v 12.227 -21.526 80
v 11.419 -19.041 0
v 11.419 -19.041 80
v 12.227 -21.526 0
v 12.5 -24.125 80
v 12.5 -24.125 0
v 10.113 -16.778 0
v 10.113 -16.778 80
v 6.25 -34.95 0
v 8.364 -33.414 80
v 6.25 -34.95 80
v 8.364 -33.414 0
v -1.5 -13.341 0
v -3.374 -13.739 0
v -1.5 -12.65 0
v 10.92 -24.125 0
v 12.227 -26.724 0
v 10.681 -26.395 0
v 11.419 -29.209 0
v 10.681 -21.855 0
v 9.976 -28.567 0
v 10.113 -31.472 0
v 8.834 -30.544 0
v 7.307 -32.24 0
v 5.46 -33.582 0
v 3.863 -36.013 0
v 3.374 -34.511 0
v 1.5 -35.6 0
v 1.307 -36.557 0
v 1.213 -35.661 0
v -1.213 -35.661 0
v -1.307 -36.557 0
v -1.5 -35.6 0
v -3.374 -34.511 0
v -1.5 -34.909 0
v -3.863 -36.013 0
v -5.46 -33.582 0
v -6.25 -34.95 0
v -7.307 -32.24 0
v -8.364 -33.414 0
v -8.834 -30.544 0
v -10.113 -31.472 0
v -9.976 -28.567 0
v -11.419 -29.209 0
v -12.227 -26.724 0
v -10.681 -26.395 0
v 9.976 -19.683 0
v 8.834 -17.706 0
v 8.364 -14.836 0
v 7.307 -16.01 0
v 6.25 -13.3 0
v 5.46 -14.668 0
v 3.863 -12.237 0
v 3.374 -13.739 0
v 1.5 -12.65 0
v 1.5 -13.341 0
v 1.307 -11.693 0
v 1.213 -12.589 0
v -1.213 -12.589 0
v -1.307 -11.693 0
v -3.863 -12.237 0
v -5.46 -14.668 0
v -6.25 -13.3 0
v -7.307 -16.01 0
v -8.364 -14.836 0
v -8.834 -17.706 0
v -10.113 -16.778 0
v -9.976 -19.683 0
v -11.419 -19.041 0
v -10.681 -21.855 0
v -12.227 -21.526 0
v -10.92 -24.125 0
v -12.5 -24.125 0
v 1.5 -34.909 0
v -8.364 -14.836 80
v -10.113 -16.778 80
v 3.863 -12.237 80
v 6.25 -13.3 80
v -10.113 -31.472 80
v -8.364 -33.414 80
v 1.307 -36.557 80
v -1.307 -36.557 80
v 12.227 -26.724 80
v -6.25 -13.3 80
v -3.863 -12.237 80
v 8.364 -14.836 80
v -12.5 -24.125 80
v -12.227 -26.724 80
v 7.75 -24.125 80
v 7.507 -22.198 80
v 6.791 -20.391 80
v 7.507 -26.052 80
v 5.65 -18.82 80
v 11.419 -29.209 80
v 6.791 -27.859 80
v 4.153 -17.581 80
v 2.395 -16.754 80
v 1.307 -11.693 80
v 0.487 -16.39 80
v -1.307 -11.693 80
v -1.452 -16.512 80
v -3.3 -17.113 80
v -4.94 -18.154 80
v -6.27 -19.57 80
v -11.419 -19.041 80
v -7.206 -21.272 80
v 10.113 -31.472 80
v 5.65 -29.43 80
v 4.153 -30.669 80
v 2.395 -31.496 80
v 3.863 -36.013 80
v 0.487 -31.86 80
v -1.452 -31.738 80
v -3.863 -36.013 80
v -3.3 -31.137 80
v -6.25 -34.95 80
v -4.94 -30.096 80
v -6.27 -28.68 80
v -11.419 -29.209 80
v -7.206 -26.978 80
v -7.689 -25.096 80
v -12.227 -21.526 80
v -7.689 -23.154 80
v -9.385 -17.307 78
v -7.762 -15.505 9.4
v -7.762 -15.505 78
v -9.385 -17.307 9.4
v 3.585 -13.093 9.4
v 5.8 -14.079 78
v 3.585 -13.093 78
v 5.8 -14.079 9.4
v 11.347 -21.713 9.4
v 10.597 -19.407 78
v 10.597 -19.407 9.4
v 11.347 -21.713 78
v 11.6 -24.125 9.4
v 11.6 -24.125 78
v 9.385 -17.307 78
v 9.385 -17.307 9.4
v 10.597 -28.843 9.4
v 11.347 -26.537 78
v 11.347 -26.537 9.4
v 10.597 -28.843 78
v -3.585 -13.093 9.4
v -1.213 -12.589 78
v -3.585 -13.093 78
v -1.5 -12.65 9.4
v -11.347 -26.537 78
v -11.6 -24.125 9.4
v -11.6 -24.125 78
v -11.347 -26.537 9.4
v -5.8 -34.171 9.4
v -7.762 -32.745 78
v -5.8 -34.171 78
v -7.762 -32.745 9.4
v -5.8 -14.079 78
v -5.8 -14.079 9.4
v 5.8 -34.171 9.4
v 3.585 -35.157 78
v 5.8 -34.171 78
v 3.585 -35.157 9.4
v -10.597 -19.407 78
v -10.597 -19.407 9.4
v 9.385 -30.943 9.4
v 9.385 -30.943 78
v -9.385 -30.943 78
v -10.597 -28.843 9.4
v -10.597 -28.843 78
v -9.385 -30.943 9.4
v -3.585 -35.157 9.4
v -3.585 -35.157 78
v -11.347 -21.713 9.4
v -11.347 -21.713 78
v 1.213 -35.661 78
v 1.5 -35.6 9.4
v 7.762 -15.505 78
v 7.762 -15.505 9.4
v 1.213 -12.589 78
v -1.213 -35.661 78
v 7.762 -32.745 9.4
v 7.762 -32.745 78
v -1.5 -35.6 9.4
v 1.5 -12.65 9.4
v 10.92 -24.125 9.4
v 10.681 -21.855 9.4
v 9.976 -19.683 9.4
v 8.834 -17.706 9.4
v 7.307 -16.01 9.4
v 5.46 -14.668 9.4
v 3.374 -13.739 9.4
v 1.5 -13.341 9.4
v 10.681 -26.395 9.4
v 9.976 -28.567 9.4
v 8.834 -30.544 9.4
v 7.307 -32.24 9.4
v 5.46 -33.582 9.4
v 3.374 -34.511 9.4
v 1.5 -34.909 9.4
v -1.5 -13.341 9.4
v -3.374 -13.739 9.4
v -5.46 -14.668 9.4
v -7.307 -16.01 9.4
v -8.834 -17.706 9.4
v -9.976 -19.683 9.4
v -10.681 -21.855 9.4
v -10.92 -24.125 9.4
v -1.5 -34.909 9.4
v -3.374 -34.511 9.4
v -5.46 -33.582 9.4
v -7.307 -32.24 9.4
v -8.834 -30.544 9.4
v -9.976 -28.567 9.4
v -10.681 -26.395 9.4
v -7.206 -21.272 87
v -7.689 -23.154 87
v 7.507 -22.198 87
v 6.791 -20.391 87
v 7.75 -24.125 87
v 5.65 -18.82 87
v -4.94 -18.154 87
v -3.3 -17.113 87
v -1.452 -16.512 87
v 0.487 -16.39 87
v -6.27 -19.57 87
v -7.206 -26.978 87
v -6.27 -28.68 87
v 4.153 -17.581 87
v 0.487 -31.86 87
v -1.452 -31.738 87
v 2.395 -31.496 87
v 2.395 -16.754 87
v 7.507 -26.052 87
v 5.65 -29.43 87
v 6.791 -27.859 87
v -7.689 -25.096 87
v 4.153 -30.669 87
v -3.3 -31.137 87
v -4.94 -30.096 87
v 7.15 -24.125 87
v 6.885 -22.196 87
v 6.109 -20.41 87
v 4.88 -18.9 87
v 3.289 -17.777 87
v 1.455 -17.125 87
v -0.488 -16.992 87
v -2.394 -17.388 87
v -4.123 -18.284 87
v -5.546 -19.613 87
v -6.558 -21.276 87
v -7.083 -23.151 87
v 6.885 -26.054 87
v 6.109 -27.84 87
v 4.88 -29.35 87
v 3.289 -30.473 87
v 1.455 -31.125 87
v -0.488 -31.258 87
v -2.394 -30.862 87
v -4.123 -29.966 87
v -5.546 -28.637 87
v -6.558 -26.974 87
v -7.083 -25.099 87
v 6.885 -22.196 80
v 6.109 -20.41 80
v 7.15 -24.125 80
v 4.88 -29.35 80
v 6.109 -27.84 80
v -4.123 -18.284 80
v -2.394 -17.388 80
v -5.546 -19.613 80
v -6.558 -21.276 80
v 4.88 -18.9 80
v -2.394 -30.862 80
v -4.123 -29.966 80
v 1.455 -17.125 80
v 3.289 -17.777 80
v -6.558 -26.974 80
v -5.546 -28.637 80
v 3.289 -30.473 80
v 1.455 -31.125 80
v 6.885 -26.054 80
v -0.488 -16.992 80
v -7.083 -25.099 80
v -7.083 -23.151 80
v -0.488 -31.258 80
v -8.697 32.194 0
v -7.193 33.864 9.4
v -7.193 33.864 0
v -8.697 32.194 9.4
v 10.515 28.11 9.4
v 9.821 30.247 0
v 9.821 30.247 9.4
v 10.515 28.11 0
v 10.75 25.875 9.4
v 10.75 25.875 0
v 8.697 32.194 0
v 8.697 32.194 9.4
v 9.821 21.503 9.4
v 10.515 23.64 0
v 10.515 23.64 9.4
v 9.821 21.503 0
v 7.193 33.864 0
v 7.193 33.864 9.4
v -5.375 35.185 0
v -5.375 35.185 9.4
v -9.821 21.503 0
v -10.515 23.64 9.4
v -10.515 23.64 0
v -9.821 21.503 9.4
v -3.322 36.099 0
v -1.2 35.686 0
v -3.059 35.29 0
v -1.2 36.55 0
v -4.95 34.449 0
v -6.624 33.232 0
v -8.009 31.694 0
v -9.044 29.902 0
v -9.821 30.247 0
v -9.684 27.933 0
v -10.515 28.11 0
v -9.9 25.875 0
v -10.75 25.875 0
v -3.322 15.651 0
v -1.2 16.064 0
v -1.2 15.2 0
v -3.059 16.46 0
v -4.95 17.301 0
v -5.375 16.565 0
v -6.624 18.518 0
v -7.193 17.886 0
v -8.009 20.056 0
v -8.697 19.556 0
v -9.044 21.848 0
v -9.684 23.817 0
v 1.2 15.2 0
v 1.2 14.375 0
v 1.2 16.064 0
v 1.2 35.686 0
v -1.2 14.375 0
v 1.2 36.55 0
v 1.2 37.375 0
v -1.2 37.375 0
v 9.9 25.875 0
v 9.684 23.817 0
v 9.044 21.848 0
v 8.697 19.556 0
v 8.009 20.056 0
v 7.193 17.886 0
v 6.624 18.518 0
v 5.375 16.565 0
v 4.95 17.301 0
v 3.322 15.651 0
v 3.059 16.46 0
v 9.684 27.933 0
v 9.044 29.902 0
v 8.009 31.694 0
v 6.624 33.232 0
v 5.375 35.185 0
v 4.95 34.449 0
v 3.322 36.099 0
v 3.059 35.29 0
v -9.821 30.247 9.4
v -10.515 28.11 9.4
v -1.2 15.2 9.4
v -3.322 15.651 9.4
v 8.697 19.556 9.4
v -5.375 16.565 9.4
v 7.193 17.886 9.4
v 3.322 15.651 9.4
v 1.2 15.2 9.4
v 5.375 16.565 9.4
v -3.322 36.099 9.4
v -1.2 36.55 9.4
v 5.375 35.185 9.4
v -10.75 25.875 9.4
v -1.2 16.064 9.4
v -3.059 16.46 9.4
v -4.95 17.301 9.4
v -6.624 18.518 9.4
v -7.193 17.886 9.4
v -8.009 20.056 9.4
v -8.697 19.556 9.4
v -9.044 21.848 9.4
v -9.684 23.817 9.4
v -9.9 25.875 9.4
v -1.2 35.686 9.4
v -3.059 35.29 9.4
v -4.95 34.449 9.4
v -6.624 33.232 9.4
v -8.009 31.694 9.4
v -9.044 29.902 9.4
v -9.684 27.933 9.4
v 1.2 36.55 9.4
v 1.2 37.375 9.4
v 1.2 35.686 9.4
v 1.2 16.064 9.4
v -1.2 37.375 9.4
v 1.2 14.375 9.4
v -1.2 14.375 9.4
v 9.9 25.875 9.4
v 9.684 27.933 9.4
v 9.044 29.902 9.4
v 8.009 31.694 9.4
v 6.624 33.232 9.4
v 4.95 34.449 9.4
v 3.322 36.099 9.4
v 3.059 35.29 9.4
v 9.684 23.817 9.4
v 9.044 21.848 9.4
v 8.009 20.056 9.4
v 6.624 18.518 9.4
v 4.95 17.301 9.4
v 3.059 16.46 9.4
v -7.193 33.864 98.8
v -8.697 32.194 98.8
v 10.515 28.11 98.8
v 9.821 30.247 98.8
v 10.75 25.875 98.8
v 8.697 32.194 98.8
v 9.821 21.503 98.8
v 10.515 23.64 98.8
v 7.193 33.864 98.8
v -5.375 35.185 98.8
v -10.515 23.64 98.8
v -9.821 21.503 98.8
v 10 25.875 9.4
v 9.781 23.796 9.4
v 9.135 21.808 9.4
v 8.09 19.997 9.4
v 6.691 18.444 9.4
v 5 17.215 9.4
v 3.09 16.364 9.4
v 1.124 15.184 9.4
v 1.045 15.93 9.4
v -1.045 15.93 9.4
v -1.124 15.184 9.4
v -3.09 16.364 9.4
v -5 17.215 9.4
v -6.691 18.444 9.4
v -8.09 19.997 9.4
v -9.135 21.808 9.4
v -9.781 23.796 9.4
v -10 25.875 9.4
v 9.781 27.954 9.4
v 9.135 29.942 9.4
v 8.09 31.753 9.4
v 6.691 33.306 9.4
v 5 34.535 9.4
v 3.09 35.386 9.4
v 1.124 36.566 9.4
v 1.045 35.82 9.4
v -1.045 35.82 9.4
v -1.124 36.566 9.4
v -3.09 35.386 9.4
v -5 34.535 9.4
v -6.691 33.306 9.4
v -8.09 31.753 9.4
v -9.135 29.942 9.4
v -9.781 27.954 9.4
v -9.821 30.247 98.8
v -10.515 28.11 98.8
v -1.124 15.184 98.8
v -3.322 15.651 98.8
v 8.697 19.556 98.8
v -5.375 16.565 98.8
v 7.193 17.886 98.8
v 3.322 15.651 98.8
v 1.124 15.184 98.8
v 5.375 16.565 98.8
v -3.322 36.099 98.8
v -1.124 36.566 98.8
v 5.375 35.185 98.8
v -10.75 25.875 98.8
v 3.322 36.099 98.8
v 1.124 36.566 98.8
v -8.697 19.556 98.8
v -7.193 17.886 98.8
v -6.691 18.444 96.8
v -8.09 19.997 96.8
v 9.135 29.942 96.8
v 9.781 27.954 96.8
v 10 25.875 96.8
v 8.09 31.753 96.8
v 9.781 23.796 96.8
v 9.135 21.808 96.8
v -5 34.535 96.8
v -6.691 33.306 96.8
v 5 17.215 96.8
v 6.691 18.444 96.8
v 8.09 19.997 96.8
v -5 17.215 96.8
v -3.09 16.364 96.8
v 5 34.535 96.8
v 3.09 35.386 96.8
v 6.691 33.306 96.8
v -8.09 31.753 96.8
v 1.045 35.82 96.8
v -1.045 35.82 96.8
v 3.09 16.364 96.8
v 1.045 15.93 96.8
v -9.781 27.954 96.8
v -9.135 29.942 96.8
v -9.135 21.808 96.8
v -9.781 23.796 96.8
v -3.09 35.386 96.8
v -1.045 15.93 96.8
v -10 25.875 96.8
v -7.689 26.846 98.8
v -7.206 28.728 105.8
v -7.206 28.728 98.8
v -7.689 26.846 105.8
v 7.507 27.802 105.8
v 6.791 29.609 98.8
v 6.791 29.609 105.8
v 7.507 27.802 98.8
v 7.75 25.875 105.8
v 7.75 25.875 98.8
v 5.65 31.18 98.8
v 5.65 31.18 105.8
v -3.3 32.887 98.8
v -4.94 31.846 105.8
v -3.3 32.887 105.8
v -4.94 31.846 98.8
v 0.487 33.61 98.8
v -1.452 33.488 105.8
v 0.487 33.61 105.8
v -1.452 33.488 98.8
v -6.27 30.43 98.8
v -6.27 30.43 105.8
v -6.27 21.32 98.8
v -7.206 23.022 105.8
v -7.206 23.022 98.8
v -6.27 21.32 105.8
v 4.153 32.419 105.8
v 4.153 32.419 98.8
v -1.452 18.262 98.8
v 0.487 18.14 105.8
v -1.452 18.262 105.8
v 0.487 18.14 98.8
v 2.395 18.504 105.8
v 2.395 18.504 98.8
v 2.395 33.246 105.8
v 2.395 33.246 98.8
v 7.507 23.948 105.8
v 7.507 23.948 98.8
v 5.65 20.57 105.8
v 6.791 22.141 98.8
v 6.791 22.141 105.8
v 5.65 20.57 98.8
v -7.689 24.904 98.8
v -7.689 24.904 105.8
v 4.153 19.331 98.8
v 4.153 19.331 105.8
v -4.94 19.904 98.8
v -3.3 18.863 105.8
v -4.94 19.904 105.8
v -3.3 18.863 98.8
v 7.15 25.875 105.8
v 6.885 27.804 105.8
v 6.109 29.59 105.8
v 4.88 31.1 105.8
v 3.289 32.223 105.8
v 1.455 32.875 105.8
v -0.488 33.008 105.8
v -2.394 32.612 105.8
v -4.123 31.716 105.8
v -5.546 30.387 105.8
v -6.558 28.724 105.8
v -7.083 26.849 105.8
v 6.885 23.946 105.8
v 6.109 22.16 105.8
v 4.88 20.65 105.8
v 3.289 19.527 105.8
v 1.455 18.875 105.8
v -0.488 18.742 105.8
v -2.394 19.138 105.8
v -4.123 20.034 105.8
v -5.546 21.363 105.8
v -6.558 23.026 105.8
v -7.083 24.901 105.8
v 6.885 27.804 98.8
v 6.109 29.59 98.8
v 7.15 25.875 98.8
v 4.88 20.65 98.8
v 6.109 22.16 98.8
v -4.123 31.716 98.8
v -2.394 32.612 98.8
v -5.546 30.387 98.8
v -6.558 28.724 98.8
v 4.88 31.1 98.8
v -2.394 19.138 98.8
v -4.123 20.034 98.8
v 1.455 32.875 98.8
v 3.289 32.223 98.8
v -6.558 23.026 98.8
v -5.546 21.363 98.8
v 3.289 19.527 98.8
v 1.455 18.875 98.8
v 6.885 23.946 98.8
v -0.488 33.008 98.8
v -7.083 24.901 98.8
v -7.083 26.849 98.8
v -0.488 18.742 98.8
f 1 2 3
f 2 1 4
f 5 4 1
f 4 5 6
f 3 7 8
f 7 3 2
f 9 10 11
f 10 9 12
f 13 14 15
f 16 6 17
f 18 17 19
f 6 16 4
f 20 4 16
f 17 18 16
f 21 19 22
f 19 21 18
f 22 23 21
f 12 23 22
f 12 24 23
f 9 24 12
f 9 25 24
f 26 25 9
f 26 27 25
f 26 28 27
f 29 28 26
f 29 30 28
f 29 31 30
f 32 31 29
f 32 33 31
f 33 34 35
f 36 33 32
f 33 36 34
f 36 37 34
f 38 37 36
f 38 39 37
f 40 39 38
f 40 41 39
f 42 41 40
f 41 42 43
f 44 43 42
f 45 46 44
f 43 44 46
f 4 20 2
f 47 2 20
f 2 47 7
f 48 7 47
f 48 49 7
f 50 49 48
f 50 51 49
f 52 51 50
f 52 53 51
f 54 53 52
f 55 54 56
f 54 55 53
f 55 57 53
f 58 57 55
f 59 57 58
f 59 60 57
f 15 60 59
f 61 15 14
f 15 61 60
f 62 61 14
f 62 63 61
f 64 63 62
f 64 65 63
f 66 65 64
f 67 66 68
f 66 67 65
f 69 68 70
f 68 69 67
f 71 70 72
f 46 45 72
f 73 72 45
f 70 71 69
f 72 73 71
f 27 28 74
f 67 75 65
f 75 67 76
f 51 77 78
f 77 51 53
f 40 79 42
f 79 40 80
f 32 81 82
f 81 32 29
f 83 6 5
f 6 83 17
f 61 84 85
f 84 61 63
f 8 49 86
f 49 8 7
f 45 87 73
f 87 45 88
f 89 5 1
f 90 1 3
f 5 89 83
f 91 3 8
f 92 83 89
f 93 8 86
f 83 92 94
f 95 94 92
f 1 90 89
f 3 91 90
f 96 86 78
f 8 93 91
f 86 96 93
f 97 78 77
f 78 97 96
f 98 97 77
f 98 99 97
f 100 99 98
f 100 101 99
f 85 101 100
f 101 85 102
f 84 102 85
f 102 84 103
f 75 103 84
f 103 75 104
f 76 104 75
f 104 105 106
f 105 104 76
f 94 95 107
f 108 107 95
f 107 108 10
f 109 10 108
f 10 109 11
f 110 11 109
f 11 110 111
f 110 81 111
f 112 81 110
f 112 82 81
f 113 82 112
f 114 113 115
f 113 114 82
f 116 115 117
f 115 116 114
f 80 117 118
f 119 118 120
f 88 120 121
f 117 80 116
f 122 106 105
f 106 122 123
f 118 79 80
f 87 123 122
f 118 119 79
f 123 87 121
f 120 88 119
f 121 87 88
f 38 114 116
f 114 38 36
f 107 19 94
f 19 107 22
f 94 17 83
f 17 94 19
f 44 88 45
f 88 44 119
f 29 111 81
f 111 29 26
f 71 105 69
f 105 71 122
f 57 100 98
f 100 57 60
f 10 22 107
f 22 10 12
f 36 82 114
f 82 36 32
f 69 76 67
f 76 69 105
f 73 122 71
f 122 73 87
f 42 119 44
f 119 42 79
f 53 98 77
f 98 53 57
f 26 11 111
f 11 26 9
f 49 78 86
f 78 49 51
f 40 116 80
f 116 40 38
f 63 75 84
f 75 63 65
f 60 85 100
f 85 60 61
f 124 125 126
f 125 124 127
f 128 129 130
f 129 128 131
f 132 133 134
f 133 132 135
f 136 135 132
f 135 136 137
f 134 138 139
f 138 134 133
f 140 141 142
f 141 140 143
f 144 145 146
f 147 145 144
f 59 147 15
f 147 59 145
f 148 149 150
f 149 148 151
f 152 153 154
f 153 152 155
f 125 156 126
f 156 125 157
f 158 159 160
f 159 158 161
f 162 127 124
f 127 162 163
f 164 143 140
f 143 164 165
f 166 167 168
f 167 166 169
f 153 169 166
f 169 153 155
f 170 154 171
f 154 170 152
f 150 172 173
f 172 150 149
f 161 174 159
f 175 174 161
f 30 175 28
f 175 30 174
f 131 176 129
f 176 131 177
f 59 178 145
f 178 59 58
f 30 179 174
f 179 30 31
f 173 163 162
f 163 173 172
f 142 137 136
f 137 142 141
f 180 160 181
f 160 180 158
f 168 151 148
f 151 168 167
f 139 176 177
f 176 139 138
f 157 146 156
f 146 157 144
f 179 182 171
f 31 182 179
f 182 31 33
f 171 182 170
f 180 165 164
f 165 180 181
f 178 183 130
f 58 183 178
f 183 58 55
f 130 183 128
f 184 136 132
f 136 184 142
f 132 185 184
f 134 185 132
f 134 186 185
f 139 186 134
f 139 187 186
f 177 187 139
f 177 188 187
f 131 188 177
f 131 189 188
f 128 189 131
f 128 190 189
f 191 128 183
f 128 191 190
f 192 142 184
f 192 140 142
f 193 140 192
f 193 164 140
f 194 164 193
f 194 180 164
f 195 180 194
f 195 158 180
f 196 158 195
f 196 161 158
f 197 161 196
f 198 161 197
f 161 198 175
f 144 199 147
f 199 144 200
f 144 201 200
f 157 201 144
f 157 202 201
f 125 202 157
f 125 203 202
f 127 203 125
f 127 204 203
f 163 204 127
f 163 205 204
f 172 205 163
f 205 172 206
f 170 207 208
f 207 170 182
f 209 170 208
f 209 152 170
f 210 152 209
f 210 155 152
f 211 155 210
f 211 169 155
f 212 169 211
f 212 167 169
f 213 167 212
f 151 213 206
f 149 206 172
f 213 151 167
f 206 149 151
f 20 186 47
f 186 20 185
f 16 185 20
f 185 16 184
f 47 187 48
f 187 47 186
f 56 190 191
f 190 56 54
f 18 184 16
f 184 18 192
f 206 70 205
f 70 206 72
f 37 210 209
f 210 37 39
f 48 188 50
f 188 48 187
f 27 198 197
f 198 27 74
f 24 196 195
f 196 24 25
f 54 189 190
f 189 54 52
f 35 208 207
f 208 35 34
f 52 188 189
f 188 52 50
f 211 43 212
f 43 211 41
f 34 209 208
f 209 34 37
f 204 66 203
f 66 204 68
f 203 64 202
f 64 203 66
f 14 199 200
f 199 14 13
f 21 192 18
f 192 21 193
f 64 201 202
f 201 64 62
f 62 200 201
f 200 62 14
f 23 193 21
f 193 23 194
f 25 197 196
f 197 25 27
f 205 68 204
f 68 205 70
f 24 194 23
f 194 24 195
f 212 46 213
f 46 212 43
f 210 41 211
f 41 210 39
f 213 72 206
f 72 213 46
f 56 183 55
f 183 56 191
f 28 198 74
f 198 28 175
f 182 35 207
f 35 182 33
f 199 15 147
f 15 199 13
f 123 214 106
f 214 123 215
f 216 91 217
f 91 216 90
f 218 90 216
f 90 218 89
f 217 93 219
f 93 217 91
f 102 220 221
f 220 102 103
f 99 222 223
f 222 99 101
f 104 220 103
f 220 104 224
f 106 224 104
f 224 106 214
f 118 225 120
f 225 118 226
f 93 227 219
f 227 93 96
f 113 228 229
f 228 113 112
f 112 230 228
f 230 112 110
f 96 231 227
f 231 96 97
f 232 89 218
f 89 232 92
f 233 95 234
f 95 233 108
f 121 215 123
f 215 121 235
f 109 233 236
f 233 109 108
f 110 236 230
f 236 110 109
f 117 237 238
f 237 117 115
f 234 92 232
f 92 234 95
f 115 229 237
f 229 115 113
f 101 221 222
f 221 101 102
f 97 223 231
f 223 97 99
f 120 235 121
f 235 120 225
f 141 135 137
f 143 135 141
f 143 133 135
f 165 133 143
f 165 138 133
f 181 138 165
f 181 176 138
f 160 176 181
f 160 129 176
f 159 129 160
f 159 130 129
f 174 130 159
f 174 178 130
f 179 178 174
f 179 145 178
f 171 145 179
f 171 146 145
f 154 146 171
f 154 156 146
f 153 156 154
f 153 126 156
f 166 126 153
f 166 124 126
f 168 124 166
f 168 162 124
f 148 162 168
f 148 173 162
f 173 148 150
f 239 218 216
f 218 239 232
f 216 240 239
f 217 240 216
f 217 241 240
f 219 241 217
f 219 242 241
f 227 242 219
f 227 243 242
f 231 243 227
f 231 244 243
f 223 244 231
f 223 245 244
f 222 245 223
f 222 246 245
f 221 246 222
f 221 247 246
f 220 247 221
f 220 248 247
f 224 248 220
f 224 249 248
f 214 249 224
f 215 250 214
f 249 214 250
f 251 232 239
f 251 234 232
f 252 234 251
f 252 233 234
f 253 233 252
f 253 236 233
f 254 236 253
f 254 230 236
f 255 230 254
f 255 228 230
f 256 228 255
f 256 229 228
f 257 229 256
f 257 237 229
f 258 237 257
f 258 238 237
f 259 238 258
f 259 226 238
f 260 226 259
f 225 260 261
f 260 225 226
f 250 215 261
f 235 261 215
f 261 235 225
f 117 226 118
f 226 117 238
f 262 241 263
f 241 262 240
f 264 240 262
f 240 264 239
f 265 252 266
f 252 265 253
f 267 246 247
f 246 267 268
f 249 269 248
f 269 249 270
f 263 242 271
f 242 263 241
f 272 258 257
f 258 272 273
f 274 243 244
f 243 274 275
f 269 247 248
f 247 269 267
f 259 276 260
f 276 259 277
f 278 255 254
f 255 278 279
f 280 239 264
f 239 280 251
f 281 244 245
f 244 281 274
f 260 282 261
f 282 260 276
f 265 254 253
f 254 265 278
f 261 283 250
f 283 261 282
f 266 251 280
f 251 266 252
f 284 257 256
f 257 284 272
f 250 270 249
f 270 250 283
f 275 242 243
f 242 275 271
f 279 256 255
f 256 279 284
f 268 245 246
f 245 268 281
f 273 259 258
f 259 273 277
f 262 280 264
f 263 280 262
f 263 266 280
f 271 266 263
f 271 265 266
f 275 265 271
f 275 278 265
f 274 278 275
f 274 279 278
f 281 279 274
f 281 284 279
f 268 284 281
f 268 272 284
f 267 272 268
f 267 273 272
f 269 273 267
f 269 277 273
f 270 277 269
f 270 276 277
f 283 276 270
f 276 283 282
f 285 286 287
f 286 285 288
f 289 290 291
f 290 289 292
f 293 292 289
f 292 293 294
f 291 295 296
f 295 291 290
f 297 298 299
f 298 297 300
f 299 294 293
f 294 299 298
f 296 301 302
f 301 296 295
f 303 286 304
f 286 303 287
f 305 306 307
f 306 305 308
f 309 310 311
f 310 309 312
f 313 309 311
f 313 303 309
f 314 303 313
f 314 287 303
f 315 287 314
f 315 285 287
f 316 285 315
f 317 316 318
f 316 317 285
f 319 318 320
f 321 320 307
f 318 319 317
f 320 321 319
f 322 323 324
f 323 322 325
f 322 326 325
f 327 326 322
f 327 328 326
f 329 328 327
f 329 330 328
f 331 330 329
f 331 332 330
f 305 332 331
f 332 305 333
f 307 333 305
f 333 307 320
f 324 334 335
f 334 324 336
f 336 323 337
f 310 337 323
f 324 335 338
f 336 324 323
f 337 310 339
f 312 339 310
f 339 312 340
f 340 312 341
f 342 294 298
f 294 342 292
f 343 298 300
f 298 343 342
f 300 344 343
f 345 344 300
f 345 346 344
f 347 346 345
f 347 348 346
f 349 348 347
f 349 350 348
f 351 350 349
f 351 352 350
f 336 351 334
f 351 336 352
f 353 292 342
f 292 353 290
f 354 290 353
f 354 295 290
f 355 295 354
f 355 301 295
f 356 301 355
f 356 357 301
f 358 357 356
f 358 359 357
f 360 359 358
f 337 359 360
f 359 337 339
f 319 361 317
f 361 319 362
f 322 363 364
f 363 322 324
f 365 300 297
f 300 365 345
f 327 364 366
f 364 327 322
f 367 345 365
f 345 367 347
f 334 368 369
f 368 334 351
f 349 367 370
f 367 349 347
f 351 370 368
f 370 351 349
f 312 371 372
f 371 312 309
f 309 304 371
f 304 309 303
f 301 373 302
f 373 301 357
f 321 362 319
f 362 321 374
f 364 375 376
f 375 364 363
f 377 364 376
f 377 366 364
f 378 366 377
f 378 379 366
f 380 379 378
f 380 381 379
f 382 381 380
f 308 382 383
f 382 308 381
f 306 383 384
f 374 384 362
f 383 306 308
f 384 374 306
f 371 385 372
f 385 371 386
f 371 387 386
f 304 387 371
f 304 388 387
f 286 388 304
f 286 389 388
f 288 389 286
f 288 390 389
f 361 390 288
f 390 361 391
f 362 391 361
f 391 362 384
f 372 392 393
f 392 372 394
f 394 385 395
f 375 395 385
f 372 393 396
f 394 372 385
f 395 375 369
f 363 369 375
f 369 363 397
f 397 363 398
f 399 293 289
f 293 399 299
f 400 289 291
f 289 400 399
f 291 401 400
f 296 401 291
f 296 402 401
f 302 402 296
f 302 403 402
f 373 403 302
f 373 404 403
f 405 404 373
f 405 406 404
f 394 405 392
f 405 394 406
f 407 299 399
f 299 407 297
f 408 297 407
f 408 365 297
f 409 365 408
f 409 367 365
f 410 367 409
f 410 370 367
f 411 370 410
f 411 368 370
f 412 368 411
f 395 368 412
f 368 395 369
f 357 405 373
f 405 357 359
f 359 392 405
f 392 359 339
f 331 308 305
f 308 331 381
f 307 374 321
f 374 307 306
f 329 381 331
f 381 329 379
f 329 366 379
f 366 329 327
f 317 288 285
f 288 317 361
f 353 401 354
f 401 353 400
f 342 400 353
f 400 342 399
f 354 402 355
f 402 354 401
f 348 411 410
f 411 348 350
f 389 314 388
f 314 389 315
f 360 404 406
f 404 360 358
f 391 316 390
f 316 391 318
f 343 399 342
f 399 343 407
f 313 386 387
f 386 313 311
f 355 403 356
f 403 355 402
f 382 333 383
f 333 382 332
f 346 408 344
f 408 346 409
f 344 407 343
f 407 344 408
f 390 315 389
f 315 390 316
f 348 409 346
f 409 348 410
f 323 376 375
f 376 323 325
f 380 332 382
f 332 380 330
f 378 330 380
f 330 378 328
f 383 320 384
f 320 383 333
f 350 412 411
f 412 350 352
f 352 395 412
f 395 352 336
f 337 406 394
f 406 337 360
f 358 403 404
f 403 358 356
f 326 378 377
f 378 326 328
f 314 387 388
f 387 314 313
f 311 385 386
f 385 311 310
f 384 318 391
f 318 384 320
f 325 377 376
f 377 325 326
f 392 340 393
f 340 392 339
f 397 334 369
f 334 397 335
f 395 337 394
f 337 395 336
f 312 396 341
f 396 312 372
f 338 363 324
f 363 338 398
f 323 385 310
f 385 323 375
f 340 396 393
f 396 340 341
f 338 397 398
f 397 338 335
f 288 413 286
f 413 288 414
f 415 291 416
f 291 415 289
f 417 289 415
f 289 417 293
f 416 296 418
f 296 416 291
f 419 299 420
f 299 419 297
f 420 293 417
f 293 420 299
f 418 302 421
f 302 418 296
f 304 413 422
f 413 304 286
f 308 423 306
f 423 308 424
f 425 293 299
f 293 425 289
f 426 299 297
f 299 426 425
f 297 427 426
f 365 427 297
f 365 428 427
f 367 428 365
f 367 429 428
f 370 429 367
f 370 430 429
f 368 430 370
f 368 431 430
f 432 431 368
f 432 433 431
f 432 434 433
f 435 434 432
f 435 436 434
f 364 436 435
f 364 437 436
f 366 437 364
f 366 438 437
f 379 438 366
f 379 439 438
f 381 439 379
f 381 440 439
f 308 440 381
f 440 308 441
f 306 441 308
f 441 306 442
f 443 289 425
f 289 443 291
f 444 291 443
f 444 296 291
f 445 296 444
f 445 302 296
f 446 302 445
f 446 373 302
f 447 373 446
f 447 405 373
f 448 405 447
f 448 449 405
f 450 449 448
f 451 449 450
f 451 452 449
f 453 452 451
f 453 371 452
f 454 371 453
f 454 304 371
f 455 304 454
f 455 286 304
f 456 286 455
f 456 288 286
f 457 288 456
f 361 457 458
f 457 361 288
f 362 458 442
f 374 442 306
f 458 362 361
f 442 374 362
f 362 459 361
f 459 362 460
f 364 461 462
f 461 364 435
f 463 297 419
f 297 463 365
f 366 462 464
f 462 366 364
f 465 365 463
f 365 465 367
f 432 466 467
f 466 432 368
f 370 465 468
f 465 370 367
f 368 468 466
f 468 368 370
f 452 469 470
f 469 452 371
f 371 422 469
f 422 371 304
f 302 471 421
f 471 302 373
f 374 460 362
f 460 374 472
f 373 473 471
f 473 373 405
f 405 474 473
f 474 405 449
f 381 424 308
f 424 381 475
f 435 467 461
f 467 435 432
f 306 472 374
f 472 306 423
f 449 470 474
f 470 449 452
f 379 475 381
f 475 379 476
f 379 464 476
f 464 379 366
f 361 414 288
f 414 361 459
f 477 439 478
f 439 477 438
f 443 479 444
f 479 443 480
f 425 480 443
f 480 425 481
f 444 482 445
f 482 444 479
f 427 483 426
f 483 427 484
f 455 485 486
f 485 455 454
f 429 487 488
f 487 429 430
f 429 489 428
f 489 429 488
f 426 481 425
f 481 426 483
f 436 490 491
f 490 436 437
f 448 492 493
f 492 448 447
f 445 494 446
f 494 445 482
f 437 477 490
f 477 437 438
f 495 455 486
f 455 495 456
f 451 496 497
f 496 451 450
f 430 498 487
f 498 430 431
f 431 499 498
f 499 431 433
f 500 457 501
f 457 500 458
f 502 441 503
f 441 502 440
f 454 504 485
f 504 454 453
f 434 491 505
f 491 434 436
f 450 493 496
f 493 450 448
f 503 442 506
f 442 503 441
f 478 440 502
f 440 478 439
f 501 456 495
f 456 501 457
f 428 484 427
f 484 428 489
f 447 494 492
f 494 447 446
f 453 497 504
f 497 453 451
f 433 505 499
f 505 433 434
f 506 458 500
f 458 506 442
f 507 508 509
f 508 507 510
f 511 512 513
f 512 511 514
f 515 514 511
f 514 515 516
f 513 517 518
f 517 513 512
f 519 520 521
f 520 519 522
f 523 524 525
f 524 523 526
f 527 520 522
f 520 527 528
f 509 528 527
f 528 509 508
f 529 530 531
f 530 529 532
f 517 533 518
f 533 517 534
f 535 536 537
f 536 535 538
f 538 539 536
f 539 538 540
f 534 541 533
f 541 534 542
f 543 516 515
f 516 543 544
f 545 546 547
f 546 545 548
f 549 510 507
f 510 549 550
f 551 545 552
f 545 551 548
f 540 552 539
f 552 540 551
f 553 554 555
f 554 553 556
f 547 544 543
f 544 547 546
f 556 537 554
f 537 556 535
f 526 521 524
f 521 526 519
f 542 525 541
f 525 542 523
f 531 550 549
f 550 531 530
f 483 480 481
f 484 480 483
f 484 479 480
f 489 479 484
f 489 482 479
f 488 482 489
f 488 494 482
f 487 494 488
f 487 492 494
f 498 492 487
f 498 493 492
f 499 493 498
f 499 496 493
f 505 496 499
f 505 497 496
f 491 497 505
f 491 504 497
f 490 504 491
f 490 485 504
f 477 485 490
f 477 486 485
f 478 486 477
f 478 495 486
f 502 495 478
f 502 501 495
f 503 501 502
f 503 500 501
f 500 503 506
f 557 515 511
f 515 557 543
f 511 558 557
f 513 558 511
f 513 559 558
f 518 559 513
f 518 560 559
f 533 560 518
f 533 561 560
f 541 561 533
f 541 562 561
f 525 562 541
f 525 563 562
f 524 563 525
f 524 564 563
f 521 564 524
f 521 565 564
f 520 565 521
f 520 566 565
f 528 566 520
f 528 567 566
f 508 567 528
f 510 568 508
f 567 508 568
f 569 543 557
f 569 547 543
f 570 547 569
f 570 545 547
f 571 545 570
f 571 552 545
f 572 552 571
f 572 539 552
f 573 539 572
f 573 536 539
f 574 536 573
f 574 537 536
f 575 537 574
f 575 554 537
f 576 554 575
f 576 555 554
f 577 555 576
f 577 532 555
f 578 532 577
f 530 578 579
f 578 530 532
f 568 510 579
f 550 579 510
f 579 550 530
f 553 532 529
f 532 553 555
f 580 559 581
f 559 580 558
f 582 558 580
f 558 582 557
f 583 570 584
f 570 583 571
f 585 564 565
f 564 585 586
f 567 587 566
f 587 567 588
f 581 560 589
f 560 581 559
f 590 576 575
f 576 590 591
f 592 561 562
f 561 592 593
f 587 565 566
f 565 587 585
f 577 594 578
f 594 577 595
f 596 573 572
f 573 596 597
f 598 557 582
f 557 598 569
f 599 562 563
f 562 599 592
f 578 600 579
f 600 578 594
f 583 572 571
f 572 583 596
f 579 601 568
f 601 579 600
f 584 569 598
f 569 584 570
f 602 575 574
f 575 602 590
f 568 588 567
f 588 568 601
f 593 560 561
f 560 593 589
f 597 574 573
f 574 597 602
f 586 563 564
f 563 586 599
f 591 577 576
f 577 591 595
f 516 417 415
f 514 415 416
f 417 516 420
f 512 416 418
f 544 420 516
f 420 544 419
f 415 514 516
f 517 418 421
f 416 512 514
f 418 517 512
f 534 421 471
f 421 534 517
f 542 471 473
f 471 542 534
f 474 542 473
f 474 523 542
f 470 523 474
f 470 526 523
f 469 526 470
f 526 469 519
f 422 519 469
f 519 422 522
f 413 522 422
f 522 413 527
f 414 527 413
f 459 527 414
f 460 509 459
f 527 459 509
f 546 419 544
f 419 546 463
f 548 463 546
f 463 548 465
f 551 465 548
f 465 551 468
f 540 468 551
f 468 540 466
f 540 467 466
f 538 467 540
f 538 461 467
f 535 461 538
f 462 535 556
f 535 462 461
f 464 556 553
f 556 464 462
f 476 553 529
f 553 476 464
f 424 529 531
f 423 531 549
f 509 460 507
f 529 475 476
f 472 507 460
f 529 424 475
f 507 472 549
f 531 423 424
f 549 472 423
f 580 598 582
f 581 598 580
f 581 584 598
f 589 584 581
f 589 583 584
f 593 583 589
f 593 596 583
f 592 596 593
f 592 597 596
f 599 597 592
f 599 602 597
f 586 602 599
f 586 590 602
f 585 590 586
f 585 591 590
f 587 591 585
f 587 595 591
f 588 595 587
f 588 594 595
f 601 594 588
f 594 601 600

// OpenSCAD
lg_dia = 25; 	// large cylinder diameter
lg_len = 80; 	// large cylinder length
lg_d = 1.8;		// large cylinder thickness

cap_dia = 15.5;
cap_len = 7;
cap_d = 1.2;

total_len = 160; // total length

sp_len = 68;	// spring length

/*
 * This generates the height of the interlocking piece.
 * It is designed to achieve 90% compression of the spring
 */
lock_h = (lg_len - ((sp_len) * .9))/2;

sm_dia = 21.5;	// small cylinder diameter
sm_len = total_len - lg_len + lock_h;	// small cylinder length
sm_d = 1.5;		// small cylinder thickness

key_sz = 3; // Thickness of the interlocking piece

/*
 * Hollow tube
 */
module tube(len,dia,thick) {
	difference() {
		cylinder(len,d=dia,dia/2);
		translate([0,0,-5]) {
			cylinder(len+10,d=(dia-thick),(dia-thick)/2);
		};
	};
};

/*
 * Endcap where tube attaches to holder
 */
module endcap(base_thick=2, base_dia, dia, height) {
	cylinder(base_thick, d=base_dia, base_dia/2);
	tube(cap_len+base_thick,cap_dia,cap_d);
}

/*
 * Simple interlocking piece
 */
module tube_lock(height,outer_dia,inner_dia,key_size) {
	difference() {
		tube(height,outer_dia,(outer_dia-inner_dia)*.8);
		translate([-key_size/2,-(outer_dia+10)/2,-5]) {
			cube([key_size,outer_dia+10,height+10]);
		};
	}
}

/*
 * Simple key
 */
module tube_key(height,outer_dia,inner_dia,key_size) {
	/* set to 90% thickness of difference between outer and inner tube */
	tube(height,inner_dia,outer_dia-inner_dia);
	translate([-(key_size*.8)/2,-(outer_dia-.2)/2,0]) {
		cube([key_size*.8,outer_dia-.2,height]);
	}
}

module big_tube() {
	union() {
		tube(lg_len, lg_dia, lg_d);
		tube_lock(lock_h,lg_dia-lg_d,sm_dia,key_sz);
		translate([0,0,lg_len-2]) {
			endcap(2, lg_dia, cap_dia, cap_len);
		}
	}
}

module small_tube() {
	union() {
		tube_key(lock_h,lg_dia-lg_d,sm_dia,key_sz);
		translate([0,0,lock_h]) {
			tube(sm_len, sm_dia, sm_d);
			translate([0,0,sm_len-2]) {
				endcap(2, sm_dia, cap_dia, cap_len);
			}
		}
	}
}		

translate([0,-(lg_dia/2+sm_dia/2+25)/2,0]) {
	big_tube();
	translate([0,50,0]) {
		small_tube();
	}
}
